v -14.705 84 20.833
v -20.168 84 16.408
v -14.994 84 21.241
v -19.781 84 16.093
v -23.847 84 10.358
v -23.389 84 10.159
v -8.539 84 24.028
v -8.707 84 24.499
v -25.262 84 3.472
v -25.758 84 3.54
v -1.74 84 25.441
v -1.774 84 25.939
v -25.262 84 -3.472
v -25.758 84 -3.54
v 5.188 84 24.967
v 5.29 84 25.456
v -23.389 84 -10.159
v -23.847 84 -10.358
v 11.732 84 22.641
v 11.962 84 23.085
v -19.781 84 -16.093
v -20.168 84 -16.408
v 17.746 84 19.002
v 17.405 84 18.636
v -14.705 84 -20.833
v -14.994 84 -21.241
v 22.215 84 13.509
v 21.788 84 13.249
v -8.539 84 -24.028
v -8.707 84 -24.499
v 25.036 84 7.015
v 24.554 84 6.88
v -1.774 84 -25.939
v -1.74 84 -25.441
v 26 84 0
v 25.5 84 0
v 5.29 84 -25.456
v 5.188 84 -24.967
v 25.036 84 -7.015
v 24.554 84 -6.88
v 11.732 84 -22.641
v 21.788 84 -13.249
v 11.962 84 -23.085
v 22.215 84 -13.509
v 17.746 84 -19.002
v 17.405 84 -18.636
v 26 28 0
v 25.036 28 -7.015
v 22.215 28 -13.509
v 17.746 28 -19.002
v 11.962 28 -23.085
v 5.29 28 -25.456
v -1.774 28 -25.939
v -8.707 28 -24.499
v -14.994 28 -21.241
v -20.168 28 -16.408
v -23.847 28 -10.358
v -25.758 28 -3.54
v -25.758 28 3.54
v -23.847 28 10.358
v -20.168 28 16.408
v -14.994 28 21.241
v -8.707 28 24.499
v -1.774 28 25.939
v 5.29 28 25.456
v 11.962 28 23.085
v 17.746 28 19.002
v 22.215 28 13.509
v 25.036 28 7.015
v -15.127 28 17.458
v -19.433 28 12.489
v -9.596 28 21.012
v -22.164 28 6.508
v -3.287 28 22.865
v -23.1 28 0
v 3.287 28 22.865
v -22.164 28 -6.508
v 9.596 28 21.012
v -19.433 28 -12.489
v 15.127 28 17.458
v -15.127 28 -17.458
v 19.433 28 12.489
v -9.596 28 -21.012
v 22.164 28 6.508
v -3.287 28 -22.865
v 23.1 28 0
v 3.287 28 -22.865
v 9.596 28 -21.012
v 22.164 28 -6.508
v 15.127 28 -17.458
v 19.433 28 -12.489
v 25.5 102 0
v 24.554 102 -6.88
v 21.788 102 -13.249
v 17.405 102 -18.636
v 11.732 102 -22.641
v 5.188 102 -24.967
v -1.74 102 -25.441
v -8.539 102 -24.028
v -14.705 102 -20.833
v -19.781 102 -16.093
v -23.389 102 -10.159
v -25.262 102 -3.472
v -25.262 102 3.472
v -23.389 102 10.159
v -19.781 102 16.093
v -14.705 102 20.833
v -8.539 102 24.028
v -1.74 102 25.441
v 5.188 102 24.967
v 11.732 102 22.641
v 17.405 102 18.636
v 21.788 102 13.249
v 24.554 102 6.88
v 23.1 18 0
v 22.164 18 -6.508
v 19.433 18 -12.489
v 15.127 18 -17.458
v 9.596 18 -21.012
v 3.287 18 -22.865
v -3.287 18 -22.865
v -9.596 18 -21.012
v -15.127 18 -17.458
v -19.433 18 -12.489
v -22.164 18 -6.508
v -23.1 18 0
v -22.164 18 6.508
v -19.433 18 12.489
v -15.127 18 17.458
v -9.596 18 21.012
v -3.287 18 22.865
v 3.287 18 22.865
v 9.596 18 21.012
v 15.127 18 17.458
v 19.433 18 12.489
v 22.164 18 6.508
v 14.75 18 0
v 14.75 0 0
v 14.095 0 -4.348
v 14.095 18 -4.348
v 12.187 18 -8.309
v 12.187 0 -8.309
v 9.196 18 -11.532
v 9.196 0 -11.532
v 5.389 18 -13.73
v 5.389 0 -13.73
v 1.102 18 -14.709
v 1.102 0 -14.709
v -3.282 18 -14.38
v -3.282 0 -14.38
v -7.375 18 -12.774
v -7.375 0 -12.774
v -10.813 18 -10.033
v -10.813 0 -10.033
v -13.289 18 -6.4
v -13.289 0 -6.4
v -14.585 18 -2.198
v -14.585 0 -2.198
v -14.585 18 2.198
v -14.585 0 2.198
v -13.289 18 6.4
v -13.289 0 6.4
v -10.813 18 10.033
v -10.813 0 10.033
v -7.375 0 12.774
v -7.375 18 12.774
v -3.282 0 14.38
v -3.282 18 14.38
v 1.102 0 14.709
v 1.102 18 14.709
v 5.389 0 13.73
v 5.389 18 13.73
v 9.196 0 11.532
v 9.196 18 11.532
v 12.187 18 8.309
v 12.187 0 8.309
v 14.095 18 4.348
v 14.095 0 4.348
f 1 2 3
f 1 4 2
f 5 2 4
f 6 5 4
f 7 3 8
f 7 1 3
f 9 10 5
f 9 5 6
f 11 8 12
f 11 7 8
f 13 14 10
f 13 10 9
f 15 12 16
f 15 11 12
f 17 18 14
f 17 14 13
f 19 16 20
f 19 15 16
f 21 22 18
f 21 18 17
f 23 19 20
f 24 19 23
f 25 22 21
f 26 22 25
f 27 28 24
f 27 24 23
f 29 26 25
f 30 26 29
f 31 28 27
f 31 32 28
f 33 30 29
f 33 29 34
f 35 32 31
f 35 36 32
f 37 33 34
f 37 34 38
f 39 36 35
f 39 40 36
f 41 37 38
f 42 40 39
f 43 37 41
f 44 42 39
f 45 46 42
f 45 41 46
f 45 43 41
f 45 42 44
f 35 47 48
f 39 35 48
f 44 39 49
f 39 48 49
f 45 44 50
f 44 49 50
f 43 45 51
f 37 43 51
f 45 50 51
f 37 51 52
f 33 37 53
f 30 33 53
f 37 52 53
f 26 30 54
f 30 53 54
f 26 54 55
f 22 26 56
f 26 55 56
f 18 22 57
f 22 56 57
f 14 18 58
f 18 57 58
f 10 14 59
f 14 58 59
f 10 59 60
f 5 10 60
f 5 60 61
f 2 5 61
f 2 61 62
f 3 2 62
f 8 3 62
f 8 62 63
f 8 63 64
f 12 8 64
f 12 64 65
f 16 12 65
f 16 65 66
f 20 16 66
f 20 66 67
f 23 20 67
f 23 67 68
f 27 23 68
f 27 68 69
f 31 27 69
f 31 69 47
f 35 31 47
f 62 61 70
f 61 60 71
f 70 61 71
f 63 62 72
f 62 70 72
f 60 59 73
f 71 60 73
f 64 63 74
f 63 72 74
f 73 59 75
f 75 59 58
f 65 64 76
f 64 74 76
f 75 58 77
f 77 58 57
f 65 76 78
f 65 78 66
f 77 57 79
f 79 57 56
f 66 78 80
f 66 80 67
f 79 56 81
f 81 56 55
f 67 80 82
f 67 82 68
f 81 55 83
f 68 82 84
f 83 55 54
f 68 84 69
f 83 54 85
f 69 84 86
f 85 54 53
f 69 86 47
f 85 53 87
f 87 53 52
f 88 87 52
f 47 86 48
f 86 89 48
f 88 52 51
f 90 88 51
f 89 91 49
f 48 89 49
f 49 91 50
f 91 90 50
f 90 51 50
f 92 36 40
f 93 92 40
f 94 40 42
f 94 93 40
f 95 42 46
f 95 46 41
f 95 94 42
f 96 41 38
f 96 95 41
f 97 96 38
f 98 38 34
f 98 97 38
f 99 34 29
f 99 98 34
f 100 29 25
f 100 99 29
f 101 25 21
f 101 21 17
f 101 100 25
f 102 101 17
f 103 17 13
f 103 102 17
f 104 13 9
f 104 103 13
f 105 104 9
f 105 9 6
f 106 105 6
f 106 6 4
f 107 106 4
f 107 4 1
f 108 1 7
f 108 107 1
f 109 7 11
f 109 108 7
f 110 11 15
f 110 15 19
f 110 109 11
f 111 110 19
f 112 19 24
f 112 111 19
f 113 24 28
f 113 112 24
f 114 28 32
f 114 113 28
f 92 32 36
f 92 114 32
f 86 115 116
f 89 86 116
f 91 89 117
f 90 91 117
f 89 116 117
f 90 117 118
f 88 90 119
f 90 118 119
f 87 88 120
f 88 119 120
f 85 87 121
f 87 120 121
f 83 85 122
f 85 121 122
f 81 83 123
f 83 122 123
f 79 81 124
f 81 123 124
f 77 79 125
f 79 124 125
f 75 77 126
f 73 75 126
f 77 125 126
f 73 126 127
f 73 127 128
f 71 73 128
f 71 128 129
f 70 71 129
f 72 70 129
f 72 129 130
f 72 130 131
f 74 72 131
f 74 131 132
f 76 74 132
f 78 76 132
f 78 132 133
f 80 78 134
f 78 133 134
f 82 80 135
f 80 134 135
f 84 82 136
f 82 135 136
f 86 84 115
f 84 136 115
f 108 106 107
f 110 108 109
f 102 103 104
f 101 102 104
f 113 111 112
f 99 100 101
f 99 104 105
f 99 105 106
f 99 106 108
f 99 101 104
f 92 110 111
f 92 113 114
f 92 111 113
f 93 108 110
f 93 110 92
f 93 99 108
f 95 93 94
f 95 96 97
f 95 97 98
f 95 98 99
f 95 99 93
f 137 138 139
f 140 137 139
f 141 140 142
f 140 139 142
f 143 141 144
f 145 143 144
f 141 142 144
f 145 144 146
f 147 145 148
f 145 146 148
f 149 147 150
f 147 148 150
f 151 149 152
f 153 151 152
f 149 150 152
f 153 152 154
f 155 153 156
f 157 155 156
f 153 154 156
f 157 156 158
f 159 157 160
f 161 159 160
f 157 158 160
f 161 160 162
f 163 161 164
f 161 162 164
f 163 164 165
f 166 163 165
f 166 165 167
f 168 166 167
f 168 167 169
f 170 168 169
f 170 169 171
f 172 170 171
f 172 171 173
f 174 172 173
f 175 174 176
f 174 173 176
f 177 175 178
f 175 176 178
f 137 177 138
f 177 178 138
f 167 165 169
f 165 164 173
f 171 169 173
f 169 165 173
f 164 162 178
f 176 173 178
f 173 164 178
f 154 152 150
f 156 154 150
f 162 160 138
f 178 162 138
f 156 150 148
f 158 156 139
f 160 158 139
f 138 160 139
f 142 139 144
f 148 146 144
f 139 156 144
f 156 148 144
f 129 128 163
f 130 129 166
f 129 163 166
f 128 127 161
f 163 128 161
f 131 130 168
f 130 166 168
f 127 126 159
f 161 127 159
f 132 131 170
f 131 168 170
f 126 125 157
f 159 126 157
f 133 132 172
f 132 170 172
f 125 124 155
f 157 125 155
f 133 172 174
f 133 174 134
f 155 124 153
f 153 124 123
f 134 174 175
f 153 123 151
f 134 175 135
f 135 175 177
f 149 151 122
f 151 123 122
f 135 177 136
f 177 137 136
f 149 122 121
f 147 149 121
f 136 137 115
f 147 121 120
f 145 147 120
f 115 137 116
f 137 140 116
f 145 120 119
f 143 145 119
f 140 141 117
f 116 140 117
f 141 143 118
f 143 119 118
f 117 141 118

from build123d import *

# Parameters (mm, degrees)
SKETCH1_R           = 14.75
BOSS_EXTRUDE1_DEPTH = 18
SKETCH2_R           = 23.1
BOSS_EXTRUDE2_DEPTH = 10
SKETCH3_R           = 26
BOSS_EXTRUDE3_DEPTH = 74
SKETCH4_R           = 26
SKETCH4_R_2         = 25.5
CUT_EXTRUDE1_DEPTH  = 18


with BuildPart() as part:
    # Sketch1 → Boss-Extrude1 (new body)
    with BuildSketch(Plane(origin=(0, 0, 0), x_dir=(1, 0, 0), z_dir=(0, 1, 0))):
        Circle(SKETCH1_R)
    extrude(amount=BOSS_EXTRUDE1_DEPTH)

    # Sketch2 → Boss-Extrude2 (add)
    with BuildSketch(Plane(origin=(0, 18, 0), x_dir=(1, 0, 0), z_dir=(0, 1, 0))):
        Circle(SKETCH2_R)
    extrude(amount=BOSS_EXTRUDE2_DEPTH)

    # Sketch3 → Boss-Extrude3 (add)
    with BuildSketch(Plane(origin=(0, 28, 0), x_dir=(1, 0, 0), z_dir=(0, 1, 0))):
        Circle(SKETCH3_R)
    extrude(amount=BOSS_EXTRUDE3_DEPTH)

    # Sketch4 → Cut-Extrude1 (cut)
    with BuildSketch(Plane(origin=(0, 102, 0), x_dir=(1, 0, 0), z_dir=(0, 1, 0))):
        Circle(SKETCH4_R)
        Circle(SKETCH4_R_2, mode=Mode.SUBTRACT)
    extrude(amount=-CUT_EXTRUDE1_DEPTH, mode=Mode.SUBTRACT)


solid = part.part
